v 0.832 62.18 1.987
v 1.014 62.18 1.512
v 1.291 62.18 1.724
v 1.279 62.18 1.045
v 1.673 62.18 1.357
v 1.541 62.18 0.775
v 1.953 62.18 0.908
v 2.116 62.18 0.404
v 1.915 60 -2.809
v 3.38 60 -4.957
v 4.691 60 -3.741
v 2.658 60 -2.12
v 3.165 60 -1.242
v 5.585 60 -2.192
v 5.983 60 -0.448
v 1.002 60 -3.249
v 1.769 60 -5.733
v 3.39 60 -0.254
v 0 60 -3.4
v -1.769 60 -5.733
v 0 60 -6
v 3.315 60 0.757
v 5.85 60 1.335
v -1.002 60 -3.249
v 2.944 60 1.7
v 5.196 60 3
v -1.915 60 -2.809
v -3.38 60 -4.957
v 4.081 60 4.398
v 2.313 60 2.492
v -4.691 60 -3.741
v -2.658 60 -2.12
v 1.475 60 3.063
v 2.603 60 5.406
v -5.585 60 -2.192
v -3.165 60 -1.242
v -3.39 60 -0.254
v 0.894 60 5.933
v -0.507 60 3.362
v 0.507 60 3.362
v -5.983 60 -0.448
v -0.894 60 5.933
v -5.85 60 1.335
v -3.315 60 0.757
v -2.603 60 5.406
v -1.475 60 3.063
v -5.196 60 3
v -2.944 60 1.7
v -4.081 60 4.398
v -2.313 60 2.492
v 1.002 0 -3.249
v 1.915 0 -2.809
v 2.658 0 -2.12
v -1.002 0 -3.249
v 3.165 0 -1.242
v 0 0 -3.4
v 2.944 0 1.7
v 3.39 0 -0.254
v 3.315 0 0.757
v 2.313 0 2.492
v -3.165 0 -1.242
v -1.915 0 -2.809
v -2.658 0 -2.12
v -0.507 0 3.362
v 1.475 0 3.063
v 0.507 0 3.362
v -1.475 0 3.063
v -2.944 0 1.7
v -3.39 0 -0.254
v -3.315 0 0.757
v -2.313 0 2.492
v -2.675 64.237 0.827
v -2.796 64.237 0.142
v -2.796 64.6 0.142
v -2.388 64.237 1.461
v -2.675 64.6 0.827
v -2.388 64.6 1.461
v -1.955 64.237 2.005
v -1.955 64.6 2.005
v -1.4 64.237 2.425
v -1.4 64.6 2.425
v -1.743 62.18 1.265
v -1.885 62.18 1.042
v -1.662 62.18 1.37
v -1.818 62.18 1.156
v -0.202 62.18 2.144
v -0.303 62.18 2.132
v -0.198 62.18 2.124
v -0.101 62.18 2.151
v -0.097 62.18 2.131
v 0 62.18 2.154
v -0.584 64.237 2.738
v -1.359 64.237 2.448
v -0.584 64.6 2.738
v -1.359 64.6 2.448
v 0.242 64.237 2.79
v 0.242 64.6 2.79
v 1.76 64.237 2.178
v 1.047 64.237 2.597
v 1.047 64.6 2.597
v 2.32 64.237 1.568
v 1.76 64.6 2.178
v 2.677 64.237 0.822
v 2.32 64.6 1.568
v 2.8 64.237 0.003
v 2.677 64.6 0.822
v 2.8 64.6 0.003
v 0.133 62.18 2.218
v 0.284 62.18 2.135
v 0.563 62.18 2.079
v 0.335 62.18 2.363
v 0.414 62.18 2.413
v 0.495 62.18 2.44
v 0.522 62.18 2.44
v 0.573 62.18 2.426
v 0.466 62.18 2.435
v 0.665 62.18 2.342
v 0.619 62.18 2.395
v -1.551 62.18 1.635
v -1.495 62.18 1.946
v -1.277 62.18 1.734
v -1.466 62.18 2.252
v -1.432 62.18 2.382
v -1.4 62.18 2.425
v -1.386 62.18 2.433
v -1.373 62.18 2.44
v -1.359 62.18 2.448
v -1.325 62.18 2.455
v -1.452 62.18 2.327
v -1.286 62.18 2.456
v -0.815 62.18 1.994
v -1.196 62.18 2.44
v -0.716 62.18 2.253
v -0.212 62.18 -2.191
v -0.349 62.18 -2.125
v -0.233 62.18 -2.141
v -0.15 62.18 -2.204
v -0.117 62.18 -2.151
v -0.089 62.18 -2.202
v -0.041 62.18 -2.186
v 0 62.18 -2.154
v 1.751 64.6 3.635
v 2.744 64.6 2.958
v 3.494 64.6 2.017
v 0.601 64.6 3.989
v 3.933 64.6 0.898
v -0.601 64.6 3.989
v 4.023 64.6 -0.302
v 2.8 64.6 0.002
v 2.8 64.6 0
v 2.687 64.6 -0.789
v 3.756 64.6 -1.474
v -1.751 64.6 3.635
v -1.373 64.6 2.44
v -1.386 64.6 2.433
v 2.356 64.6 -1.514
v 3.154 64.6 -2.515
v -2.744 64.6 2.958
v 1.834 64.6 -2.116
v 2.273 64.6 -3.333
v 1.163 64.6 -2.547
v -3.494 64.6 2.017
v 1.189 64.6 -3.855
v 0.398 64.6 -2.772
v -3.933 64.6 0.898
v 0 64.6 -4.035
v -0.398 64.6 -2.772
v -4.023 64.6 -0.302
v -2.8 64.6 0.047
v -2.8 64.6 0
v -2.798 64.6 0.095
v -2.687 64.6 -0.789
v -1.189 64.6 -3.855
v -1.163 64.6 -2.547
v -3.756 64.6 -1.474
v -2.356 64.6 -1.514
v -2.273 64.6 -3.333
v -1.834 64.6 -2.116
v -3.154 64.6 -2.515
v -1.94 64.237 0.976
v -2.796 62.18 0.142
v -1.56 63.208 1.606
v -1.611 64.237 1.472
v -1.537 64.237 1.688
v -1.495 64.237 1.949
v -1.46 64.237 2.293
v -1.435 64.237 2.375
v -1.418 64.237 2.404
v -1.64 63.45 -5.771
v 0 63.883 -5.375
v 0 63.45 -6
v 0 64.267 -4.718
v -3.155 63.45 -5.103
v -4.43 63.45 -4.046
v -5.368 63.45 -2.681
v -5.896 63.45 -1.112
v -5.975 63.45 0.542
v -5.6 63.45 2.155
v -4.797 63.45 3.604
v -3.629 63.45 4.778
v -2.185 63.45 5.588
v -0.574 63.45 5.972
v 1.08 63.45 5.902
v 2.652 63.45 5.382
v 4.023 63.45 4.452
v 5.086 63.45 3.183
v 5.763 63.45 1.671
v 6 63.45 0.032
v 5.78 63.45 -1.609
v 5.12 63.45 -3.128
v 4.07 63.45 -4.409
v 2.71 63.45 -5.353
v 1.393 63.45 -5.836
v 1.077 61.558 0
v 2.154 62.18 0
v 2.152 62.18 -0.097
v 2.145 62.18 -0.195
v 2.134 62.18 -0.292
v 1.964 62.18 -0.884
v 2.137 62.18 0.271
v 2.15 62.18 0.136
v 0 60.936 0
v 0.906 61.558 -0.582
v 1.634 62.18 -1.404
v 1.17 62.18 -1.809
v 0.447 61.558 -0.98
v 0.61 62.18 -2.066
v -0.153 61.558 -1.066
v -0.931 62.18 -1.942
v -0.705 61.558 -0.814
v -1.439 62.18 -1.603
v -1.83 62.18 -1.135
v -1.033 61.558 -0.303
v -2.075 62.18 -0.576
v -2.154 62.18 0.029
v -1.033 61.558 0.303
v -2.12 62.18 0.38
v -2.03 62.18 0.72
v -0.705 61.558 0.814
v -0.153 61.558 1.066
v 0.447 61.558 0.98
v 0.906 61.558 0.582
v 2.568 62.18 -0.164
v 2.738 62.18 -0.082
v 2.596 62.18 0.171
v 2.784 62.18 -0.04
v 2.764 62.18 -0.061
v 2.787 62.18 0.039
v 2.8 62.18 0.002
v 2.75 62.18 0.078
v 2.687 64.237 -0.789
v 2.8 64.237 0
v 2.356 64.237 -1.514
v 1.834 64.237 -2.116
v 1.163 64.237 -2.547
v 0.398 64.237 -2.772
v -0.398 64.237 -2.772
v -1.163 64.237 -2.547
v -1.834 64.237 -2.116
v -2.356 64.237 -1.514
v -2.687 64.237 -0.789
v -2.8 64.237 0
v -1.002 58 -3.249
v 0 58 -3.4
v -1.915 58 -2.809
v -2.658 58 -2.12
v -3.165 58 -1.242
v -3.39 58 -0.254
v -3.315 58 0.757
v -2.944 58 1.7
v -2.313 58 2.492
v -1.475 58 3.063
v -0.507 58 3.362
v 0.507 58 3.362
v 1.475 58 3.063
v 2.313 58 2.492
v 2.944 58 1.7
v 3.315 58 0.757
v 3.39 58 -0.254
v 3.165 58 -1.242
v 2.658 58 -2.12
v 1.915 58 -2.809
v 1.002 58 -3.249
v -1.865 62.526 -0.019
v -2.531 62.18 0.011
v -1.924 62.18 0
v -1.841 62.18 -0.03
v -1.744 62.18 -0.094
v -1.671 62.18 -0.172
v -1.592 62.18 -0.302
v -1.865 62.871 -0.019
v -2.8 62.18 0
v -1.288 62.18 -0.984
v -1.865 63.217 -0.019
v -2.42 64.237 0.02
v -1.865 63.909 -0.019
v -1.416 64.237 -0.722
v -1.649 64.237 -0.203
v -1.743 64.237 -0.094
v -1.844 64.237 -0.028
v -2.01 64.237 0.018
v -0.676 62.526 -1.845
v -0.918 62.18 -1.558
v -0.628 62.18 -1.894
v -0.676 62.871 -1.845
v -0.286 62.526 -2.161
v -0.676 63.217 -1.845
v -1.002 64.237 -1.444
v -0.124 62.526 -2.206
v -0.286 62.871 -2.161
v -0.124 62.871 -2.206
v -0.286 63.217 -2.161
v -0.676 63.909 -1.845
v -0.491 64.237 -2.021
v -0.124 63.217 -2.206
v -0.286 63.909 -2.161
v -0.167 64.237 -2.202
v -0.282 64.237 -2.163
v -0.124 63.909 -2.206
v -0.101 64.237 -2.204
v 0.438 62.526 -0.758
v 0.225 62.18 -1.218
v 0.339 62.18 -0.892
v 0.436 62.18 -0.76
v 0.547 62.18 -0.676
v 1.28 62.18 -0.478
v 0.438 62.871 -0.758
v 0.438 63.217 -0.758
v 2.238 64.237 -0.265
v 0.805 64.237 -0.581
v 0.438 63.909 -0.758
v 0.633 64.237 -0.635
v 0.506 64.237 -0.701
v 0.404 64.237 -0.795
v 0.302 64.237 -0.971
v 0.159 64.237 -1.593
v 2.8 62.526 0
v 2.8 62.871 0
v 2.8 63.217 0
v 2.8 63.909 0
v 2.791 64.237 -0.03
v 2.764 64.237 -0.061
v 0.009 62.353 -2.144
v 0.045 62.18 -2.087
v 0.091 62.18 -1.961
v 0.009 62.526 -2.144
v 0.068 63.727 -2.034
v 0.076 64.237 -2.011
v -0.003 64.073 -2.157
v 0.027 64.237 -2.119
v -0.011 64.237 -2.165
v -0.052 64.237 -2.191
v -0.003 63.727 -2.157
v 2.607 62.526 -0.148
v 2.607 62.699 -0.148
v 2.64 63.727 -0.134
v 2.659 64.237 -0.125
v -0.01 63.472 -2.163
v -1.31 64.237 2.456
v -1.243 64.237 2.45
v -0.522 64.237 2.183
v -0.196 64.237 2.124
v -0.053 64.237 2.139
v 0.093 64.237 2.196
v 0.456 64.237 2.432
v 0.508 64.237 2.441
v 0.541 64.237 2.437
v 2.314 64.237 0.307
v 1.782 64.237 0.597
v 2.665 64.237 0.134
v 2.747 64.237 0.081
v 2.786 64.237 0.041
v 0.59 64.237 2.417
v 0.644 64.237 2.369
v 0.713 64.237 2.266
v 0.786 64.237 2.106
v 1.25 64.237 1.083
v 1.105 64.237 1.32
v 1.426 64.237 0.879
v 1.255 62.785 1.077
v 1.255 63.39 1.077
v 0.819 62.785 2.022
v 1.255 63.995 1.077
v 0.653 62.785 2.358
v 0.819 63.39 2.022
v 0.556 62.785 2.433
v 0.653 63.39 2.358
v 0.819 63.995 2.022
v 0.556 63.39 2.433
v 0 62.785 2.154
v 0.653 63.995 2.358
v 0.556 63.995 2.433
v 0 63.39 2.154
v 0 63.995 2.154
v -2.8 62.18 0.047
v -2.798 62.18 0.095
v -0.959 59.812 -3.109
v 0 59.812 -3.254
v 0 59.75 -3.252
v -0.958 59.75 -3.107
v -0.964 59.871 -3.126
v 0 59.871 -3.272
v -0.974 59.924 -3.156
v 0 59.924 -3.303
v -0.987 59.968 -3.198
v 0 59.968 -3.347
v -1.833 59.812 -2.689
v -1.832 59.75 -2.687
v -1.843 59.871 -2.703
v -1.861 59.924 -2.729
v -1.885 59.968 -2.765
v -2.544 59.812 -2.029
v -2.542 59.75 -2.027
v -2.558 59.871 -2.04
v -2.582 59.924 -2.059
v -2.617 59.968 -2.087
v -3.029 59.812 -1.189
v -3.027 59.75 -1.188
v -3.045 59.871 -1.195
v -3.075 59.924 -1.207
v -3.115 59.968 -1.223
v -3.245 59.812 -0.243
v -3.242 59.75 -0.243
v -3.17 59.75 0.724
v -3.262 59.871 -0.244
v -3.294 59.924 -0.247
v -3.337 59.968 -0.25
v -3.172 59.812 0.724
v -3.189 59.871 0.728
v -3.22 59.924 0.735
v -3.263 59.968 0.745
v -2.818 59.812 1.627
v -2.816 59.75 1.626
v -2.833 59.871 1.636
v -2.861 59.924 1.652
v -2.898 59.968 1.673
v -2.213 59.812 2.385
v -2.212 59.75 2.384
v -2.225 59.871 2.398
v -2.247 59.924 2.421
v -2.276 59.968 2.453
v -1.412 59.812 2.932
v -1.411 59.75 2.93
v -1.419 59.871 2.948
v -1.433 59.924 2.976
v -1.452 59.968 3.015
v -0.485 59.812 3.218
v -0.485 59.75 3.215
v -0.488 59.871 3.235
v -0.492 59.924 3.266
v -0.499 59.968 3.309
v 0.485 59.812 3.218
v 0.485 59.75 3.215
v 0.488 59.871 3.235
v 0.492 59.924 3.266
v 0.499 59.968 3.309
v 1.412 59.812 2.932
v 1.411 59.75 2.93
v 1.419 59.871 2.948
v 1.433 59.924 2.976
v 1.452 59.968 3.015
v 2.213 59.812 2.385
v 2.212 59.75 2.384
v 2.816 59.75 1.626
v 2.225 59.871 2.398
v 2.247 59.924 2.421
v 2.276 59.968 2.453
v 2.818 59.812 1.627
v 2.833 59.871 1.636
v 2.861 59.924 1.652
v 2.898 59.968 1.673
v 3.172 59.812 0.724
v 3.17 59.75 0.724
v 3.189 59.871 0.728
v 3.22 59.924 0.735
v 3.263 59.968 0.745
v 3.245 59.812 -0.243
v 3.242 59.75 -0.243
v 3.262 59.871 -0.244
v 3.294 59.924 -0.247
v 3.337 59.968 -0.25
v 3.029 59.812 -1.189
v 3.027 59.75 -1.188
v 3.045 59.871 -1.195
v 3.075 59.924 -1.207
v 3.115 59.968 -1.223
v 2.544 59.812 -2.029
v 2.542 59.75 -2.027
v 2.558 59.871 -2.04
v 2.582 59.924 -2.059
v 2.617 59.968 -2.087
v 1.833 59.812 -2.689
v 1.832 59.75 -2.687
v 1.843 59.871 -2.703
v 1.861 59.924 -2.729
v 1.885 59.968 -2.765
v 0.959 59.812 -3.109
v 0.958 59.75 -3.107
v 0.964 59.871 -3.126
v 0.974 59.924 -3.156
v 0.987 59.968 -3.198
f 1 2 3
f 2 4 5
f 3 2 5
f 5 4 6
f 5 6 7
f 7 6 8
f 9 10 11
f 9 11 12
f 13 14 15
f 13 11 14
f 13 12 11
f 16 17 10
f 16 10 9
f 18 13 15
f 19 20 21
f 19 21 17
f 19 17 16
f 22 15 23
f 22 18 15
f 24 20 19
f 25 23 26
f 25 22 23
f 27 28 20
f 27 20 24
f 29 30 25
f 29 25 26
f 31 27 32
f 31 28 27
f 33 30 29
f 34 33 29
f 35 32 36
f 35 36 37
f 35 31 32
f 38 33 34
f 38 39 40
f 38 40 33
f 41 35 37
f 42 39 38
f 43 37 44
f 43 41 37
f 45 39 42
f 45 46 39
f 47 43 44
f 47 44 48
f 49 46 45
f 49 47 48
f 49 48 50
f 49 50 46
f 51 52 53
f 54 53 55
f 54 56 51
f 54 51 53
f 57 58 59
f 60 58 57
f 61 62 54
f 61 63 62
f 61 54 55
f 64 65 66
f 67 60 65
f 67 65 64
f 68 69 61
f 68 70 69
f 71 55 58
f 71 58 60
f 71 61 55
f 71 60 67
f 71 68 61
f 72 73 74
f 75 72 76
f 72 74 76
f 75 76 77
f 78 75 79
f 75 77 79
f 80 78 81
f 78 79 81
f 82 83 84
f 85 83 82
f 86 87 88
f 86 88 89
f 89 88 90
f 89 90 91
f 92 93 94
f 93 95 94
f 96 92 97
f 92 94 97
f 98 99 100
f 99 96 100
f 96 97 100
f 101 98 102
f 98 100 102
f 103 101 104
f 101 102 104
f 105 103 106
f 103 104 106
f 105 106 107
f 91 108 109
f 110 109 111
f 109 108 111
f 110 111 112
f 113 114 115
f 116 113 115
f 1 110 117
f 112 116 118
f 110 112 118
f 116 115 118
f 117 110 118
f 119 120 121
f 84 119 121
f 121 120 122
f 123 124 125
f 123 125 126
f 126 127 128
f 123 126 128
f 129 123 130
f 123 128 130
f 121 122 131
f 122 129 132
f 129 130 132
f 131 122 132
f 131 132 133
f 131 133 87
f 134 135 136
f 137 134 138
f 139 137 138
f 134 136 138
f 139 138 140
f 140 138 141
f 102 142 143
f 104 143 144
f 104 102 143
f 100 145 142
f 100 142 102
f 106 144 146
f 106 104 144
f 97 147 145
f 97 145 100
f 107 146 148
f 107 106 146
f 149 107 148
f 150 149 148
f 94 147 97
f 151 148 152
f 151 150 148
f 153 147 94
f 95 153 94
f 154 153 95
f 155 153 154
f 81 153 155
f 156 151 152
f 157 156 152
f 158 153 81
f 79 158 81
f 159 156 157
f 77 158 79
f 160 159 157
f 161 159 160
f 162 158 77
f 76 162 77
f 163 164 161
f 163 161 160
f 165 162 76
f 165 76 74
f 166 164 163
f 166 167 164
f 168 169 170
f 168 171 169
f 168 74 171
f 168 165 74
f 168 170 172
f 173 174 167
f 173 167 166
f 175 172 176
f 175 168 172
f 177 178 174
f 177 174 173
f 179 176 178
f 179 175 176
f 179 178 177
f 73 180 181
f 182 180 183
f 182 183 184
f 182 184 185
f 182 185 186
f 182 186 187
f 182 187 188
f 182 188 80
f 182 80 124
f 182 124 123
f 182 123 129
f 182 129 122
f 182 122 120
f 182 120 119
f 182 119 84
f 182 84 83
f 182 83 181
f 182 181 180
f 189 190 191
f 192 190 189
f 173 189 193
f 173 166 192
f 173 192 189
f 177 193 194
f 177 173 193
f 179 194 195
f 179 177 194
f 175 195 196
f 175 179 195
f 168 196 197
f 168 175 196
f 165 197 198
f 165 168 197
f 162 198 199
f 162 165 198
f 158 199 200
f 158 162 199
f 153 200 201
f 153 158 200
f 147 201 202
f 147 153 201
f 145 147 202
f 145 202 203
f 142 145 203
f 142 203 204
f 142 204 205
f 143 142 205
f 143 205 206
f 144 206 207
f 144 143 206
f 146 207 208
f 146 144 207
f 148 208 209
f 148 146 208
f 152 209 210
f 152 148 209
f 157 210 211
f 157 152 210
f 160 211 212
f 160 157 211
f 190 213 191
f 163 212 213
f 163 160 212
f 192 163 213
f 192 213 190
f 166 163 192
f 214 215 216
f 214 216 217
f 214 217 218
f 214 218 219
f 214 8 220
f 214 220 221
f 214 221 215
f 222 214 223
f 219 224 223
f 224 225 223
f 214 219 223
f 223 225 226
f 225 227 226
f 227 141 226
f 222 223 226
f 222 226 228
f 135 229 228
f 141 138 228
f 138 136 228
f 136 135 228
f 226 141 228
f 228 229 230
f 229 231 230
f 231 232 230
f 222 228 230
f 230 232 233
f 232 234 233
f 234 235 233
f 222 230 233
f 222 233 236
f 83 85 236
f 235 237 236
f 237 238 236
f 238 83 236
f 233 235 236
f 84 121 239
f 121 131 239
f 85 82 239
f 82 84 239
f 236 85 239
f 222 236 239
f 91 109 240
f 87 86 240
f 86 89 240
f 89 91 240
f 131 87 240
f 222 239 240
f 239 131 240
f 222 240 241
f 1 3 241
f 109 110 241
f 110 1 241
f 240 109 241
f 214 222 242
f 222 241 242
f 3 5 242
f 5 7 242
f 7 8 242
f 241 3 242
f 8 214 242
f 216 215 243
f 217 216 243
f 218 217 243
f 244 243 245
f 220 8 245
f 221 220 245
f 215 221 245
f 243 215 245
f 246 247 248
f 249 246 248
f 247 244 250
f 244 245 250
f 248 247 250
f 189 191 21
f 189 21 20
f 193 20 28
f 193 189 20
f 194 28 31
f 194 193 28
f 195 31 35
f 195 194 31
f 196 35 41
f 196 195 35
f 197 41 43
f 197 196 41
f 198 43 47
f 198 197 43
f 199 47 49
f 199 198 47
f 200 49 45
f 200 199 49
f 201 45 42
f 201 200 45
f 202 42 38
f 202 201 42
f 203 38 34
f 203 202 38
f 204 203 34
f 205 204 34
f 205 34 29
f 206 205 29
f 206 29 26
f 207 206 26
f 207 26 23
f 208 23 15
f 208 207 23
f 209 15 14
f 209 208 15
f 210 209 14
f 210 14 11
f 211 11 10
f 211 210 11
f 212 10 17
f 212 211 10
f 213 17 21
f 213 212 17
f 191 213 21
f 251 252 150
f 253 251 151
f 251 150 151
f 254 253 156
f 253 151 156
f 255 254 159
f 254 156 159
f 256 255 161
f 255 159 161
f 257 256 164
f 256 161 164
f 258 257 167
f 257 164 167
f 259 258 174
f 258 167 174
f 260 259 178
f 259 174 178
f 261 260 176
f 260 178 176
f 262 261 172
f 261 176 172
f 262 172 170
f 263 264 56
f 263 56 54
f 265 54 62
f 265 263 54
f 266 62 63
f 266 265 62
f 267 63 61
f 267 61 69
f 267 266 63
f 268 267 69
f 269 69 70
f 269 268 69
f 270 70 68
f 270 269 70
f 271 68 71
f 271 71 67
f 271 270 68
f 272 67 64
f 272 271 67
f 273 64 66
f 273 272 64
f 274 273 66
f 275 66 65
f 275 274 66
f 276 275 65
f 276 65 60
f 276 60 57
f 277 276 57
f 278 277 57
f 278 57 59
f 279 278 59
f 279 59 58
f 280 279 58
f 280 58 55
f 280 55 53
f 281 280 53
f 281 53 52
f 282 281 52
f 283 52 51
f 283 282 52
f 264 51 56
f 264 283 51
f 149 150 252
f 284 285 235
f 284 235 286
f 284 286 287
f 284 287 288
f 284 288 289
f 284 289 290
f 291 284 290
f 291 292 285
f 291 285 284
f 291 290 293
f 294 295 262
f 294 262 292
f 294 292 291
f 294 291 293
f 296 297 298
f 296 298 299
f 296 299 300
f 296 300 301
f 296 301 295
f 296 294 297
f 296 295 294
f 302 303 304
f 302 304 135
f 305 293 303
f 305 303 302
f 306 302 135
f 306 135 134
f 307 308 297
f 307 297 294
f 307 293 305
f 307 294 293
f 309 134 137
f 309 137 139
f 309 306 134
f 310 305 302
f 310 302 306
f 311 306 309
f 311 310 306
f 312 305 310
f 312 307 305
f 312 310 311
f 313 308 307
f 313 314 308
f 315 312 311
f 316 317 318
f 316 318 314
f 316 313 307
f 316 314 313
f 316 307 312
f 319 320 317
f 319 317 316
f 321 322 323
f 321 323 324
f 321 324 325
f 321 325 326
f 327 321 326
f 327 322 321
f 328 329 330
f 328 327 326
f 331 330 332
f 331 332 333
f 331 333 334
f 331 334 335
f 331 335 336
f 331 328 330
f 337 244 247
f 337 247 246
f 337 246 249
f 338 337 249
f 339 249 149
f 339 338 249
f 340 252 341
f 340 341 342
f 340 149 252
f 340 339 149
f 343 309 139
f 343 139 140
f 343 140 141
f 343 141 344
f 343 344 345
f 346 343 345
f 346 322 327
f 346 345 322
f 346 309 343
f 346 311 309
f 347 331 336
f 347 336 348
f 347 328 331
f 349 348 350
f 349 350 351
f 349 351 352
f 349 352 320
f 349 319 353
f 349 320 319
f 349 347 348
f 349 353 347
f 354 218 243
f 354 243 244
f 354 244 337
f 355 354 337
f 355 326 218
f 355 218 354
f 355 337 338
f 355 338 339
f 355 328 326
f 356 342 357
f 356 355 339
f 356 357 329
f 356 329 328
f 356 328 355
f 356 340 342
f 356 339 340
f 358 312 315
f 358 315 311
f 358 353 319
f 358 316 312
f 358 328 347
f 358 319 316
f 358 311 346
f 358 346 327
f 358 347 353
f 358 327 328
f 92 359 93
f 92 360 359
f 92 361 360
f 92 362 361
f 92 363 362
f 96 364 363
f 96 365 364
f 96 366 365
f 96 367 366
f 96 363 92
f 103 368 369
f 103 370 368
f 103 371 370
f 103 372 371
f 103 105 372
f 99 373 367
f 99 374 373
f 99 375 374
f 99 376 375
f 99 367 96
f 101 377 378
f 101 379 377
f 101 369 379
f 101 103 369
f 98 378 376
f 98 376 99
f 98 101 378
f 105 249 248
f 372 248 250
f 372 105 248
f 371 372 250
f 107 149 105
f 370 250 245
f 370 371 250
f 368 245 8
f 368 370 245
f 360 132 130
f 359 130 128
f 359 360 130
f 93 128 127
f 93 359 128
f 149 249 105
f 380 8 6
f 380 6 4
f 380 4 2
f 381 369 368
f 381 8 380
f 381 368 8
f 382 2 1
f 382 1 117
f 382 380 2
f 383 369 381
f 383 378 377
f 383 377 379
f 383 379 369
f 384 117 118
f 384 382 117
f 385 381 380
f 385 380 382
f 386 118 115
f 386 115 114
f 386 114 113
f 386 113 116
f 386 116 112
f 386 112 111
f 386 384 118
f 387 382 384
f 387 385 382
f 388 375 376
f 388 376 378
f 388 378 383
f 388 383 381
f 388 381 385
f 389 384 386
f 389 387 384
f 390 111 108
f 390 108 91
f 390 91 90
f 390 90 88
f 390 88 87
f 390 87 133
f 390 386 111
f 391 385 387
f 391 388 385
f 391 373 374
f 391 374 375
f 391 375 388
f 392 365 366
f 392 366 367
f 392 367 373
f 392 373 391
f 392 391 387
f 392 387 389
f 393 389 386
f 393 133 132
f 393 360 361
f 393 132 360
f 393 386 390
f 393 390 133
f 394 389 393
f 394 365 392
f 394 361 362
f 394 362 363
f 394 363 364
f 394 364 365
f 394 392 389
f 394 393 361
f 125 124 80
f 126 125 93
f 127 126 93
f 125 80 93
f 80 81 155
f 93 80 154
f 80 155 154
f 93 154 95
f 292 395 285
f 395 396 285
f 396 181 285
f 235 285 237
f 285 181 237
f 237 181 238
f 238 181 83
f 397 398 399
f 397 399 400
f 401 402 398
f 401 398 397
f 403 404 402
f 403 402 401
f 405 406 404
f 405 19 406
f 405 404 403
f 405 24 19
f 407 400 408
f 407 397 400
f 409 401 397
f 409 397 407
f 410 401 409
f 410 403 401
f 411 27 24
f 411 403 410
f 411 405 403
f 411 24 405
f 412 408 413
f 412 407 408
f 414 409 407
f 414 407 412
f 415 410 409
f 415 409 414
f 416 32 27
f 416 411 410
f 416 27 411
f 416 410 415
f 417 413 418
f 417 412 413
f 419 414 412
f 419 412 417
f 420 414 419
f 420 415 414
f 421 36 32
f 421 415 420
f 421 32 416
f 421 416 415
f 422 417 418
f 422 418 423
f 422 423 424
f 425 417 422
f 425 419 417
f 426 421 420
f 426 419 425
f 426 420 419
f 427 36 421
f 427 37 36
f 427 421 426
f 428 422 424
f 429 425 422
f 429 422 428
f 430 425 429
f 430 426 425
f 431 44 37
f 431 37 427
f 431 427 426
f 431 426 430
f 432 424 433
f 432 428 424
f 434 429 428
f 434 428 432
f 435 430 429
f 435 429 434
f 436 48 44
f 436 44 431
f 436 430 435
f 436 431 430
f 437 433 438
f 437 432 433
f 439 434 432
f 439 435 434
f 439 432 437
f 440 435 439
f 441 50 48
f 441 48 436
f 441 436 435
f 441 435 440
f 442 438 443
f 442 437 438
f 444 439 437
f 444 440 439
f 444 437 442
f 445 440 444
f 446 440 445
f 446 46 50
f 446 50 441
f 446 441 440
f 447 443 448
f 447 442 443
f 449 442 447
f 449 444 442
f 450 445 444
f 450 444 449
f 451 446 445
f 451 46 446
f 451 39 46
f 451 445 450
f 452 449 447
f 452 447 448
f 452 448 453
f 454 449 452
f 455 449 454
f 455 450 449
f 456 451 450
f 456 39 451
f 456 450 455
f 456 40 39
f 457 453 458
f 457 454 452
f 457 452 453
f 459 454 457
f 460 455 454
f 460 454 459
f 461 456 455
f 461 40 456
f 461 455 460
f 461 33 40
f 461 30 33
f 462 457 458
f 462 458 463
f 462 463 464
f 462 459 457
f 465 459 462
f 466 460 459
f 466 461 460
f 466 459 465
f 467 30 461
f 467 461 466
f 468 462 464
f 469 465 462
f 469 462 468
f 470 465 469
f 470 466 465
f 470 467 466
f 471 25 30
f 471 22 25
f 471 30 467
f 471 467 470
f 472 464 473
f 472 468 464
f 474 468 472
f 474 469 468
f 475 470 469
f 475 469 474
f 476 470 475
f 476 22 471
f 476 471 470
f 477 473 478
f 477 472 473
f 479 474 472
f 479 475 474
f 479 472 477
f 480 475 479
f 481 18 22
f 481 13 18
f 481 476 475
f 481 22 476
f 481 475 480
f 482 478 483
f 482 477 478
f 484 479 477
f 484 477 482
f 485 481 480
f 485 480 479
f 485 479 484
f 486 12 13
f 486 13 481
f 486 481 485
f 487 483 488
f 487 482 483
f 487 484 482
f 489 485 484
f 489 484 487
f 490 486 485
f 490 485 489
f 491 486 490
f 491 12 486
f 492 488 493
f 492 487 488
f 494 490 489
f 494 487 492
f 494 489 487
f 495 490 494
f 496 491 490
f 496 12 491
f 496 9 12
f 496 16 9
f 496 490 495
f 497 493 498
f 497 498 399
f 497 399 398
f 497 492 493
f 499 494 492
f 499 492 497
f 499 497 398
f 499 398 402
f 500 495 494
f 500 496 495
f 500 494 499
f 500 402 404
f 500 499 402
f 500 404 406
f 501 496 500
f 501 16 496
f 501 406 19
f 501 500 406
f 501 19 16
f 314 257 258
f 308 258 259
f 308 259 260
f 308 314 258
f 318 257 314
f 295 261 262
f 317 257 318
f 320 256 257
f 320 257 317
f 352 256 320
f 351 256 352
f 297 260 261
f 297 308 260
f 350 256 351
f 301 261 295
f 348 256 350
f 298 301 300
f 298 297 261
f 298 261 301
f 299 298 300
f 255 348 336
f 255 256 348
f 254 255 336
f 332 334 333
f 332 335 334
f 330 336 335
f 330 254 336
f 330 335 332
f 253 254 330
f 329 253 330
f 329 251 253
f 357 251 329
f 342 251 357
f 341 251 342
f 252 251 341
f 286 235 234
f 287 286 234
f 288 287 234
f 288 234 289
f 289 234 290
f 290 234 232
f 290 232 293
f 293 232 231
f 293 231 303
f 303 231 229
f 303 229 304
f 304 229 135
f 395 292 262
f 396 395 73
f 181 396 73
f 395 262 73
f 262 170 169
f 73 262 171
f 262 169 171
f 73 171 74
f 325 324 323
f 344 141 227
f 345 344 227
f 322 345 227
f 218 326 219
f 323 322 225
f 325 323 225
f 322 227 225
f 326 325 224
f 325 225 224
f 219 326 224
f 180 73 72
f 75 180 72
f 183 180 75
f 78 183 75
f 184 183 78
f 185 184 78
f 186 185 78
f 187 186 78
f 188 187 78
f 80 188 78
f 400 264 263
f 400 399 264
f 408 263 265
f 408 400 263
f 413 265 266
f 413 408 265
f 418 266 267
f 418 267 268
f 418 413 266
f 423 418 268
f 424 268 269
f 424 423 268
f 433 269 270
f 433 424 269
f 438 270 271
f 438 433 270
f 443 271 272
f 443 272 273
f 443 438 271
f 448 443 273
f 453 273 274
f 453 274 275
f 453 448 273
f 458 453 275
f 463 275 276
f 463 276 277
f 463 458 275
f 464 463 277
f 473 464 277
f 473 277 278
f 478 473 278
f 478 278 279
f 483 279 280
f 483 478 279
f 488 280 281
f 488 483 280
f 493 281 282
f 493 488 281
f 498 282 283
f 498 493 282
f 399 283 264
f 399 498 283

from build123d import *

# Parameters (mm, degrees)
RECESS_CUT_EXTRUDE1_DEPTH = 2.42
SKETCH7_R                 = 2.8
RECESS_CUT_EXTRUDE2_DEPTH = 0.363


with BuildPart() as part:
    # Sketch1 → BODY (revolve)
    with BuildSketch(Plane.XY, mode=Mode.PRIVATE) as body_sk:
        Polygon((0, 0), (3.4, 0), (3.4, 60), (6, 60), (6, 64.6), (0, 64.6), align=None)
    revolve(body_sk.sketch.rotate(Axis((0, 0, 0), (0, 1, 0)), 90), axis=Axis((0, 0, 0), (0, 1, 0)))

    # Sketch2 → HEAD-CUT (revolve, cut)
    with BuildSketch(Plane.XY, mode=Mode.PRIVATE) as head_cut_sk:
        with BuildLine():
            ThreePointArc((10, 55.45), (7.071067812, 62.521067812), (0, 65.45))
            Line((0, 65.45), (0, 65.93216157))
            Line((0, 65.93216157), (10, 65.93216157))
            Line((10, 65.93216157), (10, 55.45))
        make_face()
    revolve(head_cut_sk.sketch.rotate(Axis((0, 0, 0), (0, 1, 0)), 90), axis=Axis((0, 0, 0), (0, 1, 0)), mode=Mode.SUBTRACT)

    # Sketch4 → GAP (revolve, cut)
    with BuildSketch(Plane.XY, mode=Mode.PRIVATE) as gap_sk:
        with BuildLine():
            Line((-3.4, 58), (-3.251503787, 59.75))
            ThreePointArc((-3.251503787, 59.75), (-3.28566705, 59.89880979), (-3.4, 60))
            Line((-3.4, 60), (-3.4, 58))
        make_face()
    revolve(gap_sk.sketch.rotate(Axis((0, 0, 0), (0, 1, 0)), 270), axis=Axis((0, 0, 0), (0, 1, 0)), mode=Mode.SUBTRACT)

    # Sketch5 → Recess-Cut-Extrude1 (cut)
    with BuildSketch(Plane(origin=(0, 64.6, 0), x_dir=(-1, 0, 0), z_dir=(0, 1, 0))):
        with BuildLine():
            add(Edge.make_bspline(
                [(2.8, 0), (2.645109866, -0.023911085), (1.670994331, 0.199786237), (1.414118172, -1.106473263), (-0.315407204, -3.117616193), (-0.08378741, -0.750252113), (-1.3658447, -0.443842911), (-2.797125263, -0.196308398), (-2.80002409, 0.001077292), (-2.800023768, 0.001616003)],
                knots=[0.179018134, 0.179018134, 0.179018134, 0.179018134, 0.237467971, 0.292040128, 0.415648105, 0.507114761, 0.541693416, 0.662364746, 0.662694958, 0.662694958, 0.662694958, 0.662694958], degree=3))
            ThreePointArc((2.8, 0), (2.799094521, 0.071202971), (2.796378669, 0.142359889))
            add(Edge.make_bspline(
                [(1.4, 2.424871131), (1.513938157, 2.323513219), (1.329282824, 1.267778391), (2.57149917, 0.398112713), (2.796378669, 0.142359889)],
                knots=[0, 0, 0, 0, 0.052176783, 0.148749777, 0.148749777, 0.148749777, 0.148749777], degree=3))
            ThreePointArc((1.4, 2.424871131), (1.379598676, 2.436535962), (1.359100168, 2.448029153))
            add(Edge.make_bspline(
                [(-2.800023768, 0.001616003), (-2.799909028, 0.193193204), (-0.88460249, 0.55646964), (-0.772921937, 2.873205542), (0.205731927, 1.792311947), (1.119461988, 2.526850423), (1.359100168, 2.448029153)],
                knots=[0.662694958, 0.662694958, 0.662694958, 0.662694958, 0.780125533, 0.878673095, 0.910848295, 0.994606061, 0.994606061, 0.994606061, 0.994606061], degree=3))
        make_face()
    extrude(amount=-RECESS_CUT_EXTRUDE1_DEPTH, mode=Mode.SUBTRACT)

    # Sketch3 → DRILL-CUT (revolve, cut)
    with BuildSketch(Plane.XY):
        Polygon((0, 60.936476343), (2.153846154, 62.18), (0, 62.18), align=None)
    revolve(axis=Axis((0, 0, 0), (0, 1, 0)), mode=Mode.SUBTRACT)

    # Sketch7 → Recess-Cut-Extrude2 (cut)
    with BuildSketch(Plane(origin=(0, 64.6, 0), x_dir=(-1, 0, 0), z_dir=(0, 1, 0))):
        with Locations(Location((0, 0, 0), (0, 0, 90))):
            Circle(SKETCH7_R)
    extrude(amount=-RECESS_CUT_EXTRUDE2_DEPTH, mode=Mode.SUBTRACT)


solid = part.part
